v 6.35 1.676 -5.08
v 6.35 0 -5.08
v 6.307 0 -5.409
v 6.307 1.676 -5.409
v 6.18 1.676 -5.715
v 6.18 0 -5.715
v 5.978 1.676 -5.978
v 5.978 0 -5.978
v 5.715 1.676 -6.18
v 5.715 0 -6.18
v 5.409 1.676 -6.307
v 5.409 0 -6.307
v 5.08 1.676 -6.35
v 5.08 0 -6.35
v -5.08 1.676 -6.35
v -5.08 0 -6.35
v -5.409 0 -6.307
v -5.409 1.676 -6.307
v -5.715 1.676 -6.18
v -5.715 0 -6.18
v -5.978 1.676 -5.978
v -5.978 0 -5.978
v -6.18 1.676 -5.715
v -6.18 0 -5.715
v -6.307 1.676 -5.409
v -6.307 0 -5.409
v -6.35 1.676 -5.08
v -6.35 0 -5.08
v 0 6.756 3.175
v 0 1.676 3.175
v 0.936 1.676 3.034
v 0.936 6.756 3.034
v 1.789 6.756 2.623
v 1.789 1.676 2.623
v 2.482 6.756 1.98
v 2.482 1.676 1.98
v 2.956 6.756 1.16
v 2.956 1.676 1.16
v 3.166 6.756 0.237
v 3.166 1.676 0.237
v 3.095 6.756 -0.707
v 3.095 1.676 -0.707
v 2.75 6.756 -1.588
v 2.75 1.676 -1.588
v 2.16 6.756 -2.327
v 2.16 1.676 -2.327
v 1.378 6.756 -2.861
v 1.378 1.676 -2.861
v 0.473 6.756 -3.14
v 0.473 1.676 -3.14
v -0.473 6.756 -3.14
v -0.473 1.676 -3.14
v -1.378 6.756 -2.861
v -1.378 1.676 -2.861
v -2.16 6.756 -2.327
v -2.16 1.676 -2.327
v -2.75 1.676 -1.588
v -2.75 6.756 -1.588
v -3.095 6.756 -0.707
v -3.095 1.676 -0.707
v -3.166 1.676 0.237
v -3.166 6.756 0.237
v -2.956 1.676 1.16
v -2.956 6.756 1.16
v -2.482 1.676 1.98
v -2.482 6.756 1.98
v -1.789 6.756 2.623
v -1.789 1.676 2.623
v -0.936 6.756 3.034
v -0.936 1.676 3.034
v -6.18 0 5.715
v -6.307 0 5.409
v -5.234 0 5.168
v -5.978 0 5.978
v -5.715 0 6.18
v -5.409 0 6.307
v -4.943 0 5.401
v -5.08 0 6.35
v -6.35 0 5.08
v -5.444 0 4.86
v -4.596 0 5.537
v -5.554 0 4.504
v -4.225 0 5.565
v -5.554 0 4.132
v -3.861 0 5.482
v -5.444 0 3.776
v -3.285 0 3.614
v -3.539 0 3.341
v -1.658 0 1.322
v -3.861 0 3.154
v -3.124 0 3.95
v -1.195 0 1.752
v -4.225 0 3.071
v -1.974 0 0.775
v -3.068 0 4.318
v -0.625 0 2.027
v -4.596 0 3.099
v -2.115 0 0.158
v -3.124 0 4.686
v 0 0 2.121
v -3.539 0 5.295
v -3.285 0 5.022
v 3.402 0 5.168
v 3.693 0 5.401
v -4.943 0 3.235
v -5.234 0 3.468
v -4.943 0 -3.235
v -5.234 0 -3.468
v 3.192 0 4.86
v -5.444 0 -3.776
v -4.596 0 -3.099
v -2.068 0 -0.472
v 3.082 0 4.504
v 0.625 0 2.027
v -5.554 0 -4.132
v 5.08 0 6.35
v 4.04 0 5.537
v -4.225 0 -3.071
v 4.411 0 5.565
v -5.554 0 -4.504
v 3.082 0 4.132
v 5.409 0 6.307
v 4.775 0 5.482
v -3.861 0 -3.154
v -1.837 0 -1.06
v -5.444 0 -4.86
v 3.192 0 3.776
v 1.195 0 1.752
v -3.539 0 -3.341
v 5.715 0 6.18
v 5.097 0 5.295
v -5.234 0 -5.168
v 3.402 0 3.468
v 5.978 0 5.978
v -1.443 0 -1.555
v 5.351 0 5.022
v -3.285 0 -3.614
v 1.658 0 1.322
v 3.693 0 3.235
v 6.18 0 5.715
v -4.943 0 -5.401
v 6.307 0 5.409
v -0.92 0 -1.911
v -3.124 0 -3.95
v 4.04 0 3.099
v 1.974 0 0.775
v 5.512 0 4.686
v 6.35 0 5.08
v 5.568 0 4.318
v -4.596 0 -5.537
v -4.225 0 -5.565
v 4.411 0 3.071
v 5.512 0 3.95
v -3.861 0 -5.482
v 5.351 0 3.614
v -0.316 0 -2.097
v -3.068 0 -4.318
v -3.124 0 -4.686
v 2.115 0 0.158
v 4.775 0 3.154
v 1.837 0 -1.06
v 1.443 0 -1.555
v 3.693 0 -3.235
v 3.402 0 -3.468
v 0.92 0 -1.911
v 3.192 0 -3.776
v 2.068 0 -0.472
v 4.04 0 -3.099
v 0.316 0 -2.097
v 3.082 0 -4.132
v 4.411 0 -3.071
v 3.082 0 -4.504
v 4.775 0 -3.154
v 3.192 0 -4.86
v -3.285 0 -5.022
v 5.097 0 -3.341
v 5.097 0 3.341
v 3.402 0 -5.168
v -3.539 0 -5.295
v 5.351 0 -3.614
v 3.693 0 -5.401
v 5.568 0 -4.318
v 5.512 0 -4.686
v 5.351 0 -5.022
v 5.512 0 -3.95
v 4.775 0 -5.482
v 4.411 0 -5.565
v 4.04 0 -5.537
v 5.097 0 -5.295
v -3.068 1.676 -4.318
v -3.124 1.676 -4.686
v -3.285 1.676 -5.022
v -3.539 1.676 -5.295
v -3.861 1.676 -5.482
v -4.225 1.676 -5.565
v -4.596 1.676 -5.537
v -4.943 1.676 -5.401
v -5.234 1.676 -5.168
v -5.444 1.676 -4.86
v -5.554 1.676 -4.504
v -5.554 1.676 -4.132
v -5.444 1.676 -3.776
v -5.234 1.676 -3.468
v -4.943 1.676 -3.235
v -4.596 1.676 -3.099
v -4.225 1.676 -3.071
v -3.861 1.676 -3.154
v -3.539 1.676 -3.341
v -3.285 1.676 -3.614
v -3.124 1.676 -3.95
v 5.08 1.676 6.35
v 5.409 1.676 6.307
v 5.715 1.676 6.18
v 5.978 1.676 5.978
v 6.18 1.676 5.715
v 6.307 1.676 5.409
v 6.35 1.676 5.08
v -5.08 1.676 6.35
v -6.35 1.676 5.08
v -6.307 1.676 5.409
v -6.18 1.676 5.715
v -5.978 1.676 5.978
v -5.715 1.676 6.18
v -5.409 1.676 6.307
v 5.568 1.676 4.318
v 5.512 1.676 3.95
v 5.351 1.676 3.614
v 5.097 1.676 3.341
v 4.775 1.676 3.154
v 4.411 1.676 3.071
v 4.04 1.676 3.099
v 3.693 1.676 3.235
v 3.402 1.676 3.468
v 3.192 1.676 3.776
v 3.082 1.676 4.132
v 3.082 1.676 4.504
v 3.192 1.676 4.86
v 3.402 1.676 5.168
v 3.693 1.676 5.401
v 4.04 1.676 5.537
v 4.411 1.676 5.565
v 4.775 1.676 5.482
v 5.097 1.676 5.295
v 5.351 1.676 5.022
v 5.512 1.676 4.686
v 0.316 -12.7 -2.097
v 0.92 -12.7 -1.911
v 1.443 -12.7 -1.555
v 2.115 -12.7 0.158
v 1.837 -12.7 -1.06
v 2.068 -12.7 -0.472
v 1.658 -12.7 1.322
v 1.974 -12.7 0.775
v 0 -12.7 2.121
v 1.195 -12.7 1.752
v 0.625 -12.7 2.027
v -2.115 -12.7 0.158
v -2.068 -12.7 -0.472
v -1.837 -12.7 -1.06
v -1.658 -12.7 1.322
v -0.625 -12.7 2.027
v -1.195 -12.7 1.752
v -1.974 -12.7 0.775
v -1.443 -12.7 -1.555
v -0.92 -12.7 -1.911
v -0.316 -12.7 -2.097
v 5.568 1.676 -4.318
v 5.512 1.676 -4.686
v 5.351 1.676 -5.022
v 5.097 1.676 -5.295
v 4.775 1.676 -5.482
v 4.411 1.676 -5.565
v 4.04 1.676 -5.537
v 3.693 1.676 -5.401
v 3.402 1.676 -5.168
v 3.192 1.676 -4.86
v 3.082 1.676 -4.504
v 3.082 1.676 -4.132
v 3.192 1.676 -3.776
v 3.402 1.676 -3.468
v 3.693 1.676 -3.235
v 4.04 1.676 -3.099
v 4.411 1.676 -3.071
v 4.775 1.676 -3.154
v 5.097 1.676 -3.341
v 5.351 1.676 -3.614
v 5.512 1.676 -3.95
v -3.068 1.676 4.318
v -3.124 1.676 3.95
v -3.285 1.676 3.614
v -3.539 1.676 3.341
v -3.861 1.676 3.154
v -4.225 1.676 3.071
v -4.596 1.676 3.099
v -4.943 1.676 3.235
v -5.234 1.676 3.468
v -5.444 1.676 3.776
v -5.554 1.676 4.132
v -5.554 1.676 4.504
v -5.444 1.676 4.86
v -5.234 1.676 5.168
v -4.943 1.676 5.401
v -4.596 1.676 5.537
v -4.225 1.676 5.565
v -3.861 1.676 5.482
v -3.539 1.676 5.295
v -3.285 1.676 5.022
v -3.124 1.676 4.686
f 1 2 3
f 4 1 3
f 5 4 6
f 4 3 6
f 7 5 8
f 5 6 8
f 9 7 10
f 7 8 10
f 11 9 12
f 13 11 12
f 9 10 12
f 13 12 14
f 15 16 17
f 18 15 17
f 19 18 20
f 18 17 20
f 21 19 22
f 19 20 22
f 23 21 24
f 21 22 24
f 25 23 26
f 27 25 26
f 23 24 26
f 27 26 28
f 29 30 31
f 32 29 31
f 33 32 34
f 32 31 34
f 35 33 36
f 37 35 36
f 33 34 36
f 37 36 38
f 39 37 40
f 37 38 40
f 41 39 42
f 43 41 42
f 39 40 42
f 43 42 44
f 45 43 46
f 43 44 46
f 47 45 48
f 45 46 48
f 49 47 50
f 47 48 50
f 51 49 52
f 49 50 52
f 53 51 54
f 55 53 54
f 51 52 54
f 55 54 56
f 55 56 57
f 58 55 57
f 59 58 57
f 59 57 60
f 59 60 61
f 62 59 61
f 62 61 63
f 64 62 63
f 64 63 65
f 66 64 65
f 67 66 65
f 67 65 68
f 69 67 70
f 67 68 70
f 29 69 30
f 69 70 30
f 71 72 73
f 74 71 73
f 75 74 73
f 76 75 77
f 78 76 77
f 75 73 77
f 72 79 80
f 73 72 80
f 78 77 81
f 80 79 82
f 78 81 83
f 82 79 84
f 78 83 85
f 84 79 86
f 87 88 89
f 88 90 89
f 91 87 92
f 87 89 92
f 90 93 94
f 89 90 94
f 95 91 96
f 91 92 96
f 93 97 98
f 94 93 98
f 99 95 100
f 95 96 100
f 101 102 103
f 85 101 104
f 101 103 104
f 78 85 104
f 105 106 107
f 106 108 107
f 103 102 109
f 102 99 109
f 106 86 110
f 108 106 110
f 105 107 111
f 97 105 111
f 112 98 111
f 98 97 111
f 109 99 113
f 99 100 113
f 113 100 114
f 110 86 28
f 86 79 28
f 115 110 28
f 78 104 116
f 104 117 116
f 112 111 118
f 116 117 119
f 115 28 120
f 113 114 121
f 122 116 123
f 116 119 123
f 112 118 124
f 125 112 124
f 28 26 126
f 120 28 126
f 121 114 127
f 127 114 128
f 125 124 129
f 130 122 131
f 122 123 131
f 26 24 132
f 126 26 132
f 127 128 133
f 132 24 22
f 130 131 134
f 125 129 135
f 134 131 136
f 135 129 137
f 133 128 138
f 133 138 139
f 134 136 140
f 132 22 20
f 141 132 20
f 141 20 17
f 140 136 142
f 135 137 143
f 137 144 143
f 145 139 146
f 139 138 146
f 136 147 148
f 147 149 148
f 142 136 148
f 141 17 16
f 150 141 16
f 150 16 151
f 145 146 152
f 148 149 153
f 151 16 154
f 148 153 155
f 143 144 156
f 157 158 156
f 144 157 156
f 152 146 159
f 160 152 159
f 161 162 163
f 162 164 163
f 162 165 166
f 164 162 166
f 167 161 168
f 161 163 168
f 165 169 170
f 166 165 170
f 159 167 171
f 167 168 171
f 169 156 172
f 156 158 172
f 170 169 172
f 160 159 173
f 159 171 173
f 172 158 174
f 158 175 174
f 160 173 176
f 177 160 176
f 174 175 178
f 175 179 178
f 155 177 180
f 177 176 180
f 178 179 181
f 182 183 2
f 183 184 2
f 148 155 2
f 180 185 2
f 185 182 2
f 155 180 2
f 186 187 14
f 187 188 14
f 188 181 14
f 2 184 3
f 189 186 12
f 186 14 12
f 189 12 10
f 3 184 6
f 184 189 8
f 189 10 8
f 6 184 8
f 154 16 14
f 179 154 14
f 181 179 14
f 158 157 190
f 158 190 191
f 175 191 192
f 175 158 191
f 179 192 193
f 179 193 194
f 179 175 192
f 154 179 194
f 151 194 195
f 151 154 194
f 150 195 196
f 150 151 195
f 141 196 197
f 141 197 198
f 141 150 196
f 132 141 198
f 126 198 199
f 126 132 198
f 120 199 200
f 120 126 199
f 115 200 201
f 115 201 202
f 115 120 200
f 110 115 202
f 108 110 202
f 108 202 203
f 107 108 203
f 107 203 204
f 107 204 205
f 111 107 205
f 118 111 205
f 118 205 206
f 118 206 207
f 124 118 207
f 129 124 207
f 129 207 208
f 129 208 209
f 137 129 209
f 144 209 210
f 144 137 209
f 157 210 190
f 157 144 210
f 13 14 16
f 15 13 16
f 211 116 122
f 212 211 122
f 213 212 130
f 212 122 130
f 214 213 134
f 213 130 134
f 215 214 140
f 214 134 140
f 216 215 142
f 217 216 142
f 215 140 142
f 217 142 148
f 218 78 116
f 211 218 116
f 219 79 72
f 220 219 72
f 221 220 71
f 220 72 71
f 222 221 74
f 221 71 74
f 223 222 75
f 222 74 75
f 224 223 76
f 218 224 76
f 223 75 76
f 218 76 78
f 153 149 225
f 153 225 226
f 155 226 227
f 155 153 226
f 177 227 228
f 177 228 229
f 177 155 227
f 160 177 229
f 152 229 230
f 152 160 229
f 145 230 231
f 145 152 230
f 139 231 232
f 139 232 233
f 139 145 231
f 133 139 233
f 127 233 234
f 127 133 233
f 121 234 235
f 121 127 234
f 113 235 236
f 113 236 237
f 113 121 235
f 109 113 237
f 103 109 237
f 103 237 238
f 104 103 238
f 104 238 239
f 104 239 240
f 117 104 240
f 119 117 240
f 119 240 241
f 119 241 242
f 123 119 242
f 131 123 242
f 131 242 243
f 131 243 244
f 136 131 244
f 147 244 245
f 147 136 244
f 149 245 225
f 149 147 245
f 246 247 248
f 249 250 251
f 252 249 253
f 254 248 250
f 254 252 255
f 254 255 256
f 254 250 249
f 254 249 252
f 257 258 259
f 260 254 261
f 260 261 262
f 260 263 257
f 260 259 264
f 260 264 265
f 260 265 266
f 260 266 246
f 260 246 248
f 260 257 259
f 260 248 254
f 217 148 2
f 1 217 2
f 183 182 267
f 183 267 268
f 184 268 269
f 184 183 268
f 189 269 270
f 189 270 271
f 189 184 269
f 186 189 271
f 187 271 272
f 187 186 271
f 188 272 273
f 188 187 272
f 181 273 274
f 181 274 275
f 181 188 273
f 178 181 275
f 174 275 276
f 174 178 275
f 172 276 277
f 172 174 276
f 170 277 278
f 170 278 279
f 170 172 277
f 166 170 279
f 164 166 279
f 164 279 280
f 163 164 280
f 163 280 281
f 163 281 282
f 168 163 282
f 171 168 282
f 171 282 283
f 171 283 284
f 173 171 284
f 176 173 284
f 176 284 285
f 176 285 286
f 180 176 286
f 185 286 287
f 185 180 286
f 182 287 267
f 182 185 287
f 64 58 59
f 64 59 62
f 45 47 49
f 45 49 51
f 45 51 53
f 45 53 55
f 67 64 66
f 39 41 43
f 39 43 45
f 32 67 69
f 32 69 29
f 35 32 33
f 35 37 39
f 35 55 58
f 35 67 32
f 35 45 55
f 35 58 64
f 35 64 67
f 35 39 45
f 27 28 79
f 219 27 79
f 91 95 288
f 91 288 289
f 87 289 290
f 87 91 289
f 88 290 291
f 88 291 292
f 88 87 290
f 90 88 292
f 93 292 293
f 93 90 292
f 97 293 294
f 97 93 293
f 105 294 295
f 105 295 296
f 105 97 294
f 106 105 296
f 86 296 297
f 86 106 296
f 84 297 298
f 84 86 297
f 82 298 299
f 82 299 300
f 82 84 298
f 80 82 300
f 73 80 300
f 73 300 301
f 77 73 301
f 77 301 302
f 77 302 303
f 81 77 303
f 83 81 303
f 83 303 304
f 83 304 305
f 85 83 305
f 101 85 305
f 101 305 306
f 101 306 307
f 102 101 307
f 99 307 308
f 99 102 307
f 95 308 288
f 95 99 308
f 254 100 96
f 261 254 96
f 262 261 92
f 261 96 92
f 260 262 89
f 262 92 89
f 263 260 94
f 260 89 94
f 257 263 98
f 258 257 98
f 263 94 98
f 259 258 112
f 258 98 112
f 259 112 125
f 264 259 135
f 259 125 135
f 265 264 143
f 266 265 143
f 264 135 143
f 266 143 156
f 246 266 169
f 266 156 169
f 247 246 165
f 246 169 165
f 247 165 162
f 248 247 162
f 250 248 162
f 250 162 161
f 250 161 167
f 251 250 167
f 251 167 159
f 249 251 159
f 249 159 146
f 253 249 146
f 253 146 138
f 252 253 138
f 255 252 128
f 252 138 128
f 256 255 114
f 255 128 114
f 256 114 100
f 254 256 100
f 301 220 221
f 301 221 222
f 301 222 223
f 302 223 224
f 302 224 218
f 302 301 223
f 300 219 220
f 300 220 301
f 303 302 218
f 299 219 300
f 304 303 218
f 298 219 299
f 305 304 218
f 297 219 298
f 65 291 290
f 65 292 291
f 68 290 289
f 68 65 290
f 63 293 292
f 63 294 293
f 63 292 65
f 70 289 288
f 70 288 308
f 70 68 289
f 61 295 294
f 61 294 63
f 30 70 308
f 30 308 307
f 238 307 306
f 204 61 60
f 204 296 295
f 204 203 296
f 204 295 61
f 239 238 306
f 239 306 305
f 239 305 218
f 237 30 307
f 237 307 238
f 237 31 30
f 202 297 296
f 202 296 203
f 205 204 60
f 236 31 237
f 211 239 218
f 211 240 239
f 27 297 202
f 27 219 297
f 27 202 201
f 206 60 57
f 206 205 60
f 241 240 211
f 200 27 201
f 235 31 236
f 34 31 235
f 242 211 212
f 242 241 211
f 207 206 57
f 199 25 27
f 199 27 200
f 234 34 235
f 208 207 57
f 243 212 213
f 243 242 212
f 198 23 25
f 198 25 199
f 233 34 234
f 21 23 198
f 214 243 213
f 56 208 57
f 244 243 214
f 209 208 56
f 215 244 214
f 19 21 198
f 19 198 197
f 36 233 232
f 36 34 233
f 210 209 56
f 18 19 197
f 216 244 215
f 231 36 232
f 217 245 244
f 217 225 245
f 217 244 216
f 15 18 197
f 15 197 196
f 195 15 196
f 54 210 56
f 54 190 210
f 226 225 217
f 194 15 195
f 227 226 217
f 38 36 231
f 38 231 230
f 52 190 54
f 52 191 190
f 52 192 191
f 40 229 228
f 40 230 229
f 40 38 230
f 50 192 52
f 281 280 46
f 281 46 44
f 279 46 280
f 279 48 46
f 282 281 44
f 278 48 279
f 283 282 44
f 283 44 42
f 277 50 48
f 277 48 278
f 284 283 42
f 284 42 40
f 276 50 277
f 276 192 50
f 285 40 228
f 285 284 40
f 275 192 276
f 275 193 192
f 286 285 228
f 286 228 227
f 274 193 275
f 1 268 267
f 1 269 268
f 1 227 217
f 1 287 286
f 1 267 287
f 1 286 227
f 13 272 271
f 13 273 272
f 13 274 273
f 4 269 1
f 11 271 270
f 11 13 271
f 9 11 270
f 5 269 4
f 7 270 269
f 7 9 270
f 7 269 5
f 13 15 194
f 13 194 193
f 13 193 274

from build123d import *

# Parameters (mm, degrees)
BOSS_EXTRUDE1_DEPTH           = 1.6764
F_2_5MM_DOWEL_HOLE1_OUTLINE_R = 1.25
F_2_5MM_DOWEL_HOLE1_DEPTH     = 1.6764
SKETCH4_R                     = 3.175
BOSS_EXTRUDE2_DEPTH           = 5.08
SKETCH5_R                     = 2.1209
BOSS_EXTRUDE3_DEPTH           = 12.7


# Read off the part's stored shape, not the designer's step: Ø2.5mm Dowel Hole1
with BuildPart() as part:
    # Sketch1 → Boss-Extrude1 (new body)
    with BuildSketch(Plane(origin=(0, 0, 0), x_dir=(1, 0, 0), z_dir=(0, 1, 0))):
        with BuildLine():
            Line((-5.08, -6.35), (5.08, -6.35))
            ThreePointArc((5.08, -6.35), (5.978025612, -5.978025612), (6.35, -5.08))
            Line((6.35, -5.08), (6.35, 5.08))
            ThreePointArc((6.35, 5.08), (5.978025612, 5.978025612), (5.08, 6.35))
            Line((5.08, 6.35), (-5.08, 6.35))
            ThreePointArc((-5.08, 6.35), (-5.978025612, 5.978025612), (-6.35, 5.08))
            Line((-6.35, 5.08), (-6.35, -5.08))
            ThreePointArc((-6.35, -5.08), (-5.978025612, -5.978025612), (-5.08, -6.35))
        make_face()
    extrude(amount=BOSS_EXTRUDE1_DEPTH)

    # Ø2.5mm Dowel Hole1 outline → Ø2.5mm Dowel Hole1 (cut)
    with BuildSketch(Plane(origin=(0, 0, 0), x_dir=(1, 0, 0), z_dir=(0, 1, 0))):
        with Locations((4.318, -4.318)):
            Circle(F_2_5MM_DOWEL_HOLE1_OUTLINE_R)
        with Locations((-4.318, 4.318)):
            Circle(F_2_5MM_DOWEL_HOLE1_OUTLINE_R)
        with Locations((-4.318, -4.318)):
            Circle(F_2_5MM_DOWEL_HOLE1_OUTLINE_R)
        with Locations((4.318, 4.318)):
            Circle(F_2_5MM_DOWEL_HOLE1_OUTLINE_R)
    extrude(amount=F_2_5MM_DOWEL_HOLE1_DEPTH, mode=Mode.SUBTRACT)

    # Sketch4 → Boss-Extrude2 (add)
    with BuildSketch(Plane(origin=(0, 1.6764, 0), x_dir=(1, 0, 0), z_dir=(0, 1, 0))):
        with Locations(Location((0, 0, 0), (0, 0, 270))):
            Circle(SKETCH4_R)
    extrude(amount=BOSS_EXTRUDE2_DEPTH)

    # Sketch5 → Boss-Extrude3 (add)
    with BuildSketch(Plane.XZ):
        with Locations(Location((0, 0, 0), (0, 0, 90))):
            Circle(SKETCH5_R)
    extrude(amount=BOSS_EXTRUDE3_DEPTH)


solid = part.part
